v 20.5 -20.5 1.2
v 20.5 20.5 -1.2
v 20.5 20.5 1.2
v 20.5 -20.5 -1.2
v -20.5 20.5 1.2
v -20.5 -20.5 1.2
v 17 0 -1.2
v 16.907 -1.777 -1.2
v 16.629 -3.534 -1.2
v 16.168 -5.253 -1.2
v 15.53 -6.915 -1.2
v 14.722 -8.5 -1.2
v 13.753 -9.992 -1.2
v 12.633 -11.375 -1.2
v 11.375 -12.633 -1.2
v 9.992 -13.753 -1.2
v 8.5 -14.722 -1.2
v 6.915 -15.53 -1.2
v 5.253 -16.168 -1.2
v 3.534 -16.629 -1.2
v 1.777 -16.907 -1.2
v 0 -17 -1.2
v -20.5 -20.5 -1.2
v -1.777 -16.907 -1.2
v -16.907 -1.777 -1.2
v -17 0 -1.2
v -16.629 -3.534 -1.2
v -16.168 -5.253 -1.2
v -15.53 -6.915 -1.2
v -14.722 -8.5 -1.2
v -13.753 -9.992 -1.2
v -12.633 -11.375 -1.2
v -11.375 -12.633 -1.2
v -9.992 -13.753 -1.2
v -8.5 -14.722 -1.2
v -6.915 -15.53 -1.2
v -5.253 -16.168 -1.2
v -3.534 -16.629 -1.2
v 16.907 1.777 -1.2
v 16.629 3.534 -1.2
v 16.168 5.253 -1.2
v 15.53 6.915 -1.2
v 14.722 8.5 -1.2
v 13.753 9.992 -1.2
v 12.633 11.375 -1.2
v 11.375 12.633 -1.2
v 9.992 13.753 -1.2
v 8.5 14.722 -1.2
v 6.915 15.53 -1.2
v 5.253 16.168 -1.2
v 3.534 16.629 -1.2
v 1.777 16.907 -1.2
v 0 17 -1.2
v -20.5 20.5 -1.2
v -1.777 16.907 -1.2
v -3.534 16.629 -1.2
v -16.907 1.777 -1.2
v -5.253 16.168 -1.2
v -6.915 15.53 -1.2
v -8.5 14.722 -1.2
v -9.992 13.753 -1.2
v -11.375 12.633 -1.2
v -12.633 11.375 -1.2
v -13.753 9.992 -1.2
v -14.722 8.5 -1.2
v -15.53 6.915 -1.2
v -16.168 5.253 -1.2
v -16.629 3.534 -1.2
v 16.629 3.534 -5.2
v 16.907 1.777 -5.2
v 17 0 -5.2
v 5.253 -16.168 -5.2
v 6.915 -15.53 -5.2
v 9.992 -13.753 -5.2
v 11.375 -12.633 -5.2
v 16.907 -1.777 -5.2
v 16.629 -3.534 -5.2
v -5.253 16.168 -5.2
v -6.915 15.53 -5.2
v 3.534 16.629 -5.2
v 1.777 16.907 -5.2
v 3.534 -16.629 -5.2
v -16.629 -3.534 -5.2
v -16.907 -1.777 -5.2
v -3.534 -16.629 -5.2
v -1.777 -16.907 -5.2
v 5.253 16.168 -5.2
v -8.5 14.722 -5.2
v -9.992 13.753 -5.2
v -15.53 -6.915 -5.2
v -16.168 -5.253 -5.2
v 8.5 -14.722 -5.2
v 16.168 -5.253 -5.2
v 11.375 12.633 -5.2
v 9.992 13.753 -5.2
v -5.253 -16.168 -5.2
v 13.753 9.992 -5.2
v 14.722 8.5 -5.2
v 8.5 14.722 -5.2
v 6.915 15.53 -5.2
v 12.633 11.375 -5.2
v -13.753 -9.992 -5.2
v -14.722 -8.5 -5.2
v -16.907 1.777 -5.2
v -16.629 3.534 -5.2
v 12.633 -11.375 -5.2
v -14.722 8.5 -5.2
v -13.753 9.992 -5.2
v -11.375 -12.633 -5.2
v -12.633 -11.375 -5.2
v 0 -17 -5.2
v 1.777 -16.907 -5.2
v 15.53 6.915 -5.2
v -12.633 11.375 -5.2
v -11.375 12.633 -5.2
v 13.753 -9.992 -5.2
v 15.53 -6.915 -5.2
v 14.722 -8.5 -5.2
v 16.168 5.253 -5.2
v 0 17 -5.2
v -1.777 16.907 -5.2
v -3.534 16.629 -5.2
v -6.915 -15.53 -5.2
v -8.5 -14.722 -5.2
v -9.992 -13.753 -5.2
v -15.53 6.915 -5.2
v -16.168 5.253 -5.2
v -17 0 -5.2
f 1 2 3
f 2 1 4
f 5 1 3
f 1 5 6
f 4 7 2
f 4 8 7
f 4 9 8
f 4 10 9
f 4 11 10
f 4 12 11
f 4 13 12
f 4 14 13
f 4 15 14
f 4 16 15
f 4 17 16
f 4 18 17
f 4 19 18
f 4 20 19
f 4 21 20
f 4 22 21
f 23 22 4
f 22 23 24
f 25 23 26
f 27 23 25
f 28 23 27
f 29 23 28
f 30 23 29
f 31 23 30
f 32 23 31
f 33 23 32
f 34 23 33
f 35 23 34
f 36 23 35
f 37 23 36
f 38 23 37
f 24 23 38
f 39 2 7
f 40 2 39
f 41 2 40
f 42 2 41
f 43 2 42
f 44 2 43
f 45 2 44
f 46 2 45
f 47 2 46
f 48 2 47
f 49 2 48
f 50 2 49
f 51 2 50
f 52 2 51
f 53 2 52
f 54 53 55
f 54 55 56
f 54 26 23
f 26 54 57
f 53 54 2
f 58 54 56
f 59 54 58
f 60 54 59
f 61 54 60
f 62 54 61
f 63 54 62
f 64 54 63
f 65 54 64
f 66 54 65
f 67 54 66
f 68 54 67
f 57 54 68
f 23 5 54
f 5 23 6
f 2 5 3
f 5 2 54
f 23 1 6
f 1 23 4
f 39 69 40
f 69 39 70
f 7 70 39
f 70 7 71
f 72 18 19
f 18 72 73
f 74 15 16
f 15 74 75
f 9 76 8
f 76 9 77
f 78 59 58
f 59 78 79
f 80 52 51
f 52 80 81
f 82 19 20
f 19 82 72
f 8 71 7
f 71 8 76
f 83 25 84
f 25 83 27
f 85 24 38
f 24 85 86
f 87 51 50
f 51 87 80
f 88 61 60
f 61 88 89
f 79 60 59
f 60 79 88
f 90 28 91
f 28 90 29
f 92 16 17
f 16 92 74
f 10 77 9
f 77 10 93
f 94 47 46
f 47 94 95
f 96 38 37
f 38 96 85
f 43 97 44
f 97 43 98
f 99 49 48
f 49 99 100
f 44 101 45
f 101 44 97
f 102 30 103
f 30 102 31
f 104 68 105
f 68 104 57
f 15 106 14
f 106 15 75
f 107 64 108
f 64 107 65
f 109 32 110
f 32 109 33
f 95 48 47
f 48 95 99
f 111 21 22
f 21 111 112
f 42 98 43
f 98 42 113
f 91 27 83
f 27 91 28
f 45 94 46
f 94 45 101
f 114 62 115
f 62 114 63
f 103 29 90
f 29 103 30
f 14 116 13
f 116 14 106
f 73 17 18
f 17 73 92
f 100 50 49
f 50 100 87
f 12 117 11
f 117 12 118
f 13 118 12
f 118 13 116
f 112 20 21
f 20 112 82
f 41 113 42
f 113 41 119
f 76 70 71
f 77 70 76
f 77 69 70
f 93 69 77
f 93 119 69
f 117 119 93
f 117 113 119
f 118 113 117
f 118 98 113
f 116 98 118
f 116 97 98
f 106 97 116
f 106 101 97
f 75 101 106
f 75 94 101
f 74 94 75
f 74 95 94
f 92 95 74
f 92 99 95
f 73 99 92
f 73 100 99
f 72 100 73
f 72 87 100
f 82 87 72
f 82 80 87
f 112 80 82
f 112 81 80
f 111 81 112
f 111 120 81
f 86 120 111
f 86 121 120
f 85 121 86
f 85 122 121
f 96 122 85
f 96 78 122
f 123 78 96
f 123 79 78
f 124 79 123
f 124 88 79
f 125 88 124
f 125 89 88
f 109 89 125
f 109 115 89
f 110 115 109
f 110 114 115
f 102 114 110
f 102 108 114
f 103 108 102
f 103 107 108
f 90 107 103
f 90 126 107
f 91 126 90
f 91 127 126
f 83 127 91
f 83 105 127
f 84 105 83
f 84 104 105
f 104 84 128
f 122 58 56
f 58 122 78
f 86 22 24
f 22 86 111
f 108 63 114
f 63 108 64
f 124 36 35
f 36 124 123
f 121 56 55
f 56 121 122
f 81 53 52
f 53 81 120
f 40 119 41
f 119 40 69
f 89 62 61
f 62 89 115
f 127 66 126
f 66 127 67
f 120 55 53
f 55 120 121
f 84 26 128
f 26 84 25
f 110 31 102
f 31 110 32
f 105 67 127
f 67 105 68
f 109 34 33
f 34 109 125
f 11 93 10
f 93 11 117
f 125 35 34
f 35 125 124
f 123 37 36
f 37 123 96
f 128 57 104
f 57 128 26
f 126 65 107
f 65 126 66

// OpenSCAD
// Press-fit end cap for 40 mm extrusion.
$fn = 60;
eps = 0.02;
profile = 40;
cap_t = 2.4;
wall = 3;
pin_d = profile - 2 * wall;
pin_l = 4;
union() {
    cube([profile + 1, profile + 1, cap_t], center = true);
    translate([0, 0, -cap_t / 2 - pin_l]) cylinder(d = pin_d, h = pin_l + eps);
}
